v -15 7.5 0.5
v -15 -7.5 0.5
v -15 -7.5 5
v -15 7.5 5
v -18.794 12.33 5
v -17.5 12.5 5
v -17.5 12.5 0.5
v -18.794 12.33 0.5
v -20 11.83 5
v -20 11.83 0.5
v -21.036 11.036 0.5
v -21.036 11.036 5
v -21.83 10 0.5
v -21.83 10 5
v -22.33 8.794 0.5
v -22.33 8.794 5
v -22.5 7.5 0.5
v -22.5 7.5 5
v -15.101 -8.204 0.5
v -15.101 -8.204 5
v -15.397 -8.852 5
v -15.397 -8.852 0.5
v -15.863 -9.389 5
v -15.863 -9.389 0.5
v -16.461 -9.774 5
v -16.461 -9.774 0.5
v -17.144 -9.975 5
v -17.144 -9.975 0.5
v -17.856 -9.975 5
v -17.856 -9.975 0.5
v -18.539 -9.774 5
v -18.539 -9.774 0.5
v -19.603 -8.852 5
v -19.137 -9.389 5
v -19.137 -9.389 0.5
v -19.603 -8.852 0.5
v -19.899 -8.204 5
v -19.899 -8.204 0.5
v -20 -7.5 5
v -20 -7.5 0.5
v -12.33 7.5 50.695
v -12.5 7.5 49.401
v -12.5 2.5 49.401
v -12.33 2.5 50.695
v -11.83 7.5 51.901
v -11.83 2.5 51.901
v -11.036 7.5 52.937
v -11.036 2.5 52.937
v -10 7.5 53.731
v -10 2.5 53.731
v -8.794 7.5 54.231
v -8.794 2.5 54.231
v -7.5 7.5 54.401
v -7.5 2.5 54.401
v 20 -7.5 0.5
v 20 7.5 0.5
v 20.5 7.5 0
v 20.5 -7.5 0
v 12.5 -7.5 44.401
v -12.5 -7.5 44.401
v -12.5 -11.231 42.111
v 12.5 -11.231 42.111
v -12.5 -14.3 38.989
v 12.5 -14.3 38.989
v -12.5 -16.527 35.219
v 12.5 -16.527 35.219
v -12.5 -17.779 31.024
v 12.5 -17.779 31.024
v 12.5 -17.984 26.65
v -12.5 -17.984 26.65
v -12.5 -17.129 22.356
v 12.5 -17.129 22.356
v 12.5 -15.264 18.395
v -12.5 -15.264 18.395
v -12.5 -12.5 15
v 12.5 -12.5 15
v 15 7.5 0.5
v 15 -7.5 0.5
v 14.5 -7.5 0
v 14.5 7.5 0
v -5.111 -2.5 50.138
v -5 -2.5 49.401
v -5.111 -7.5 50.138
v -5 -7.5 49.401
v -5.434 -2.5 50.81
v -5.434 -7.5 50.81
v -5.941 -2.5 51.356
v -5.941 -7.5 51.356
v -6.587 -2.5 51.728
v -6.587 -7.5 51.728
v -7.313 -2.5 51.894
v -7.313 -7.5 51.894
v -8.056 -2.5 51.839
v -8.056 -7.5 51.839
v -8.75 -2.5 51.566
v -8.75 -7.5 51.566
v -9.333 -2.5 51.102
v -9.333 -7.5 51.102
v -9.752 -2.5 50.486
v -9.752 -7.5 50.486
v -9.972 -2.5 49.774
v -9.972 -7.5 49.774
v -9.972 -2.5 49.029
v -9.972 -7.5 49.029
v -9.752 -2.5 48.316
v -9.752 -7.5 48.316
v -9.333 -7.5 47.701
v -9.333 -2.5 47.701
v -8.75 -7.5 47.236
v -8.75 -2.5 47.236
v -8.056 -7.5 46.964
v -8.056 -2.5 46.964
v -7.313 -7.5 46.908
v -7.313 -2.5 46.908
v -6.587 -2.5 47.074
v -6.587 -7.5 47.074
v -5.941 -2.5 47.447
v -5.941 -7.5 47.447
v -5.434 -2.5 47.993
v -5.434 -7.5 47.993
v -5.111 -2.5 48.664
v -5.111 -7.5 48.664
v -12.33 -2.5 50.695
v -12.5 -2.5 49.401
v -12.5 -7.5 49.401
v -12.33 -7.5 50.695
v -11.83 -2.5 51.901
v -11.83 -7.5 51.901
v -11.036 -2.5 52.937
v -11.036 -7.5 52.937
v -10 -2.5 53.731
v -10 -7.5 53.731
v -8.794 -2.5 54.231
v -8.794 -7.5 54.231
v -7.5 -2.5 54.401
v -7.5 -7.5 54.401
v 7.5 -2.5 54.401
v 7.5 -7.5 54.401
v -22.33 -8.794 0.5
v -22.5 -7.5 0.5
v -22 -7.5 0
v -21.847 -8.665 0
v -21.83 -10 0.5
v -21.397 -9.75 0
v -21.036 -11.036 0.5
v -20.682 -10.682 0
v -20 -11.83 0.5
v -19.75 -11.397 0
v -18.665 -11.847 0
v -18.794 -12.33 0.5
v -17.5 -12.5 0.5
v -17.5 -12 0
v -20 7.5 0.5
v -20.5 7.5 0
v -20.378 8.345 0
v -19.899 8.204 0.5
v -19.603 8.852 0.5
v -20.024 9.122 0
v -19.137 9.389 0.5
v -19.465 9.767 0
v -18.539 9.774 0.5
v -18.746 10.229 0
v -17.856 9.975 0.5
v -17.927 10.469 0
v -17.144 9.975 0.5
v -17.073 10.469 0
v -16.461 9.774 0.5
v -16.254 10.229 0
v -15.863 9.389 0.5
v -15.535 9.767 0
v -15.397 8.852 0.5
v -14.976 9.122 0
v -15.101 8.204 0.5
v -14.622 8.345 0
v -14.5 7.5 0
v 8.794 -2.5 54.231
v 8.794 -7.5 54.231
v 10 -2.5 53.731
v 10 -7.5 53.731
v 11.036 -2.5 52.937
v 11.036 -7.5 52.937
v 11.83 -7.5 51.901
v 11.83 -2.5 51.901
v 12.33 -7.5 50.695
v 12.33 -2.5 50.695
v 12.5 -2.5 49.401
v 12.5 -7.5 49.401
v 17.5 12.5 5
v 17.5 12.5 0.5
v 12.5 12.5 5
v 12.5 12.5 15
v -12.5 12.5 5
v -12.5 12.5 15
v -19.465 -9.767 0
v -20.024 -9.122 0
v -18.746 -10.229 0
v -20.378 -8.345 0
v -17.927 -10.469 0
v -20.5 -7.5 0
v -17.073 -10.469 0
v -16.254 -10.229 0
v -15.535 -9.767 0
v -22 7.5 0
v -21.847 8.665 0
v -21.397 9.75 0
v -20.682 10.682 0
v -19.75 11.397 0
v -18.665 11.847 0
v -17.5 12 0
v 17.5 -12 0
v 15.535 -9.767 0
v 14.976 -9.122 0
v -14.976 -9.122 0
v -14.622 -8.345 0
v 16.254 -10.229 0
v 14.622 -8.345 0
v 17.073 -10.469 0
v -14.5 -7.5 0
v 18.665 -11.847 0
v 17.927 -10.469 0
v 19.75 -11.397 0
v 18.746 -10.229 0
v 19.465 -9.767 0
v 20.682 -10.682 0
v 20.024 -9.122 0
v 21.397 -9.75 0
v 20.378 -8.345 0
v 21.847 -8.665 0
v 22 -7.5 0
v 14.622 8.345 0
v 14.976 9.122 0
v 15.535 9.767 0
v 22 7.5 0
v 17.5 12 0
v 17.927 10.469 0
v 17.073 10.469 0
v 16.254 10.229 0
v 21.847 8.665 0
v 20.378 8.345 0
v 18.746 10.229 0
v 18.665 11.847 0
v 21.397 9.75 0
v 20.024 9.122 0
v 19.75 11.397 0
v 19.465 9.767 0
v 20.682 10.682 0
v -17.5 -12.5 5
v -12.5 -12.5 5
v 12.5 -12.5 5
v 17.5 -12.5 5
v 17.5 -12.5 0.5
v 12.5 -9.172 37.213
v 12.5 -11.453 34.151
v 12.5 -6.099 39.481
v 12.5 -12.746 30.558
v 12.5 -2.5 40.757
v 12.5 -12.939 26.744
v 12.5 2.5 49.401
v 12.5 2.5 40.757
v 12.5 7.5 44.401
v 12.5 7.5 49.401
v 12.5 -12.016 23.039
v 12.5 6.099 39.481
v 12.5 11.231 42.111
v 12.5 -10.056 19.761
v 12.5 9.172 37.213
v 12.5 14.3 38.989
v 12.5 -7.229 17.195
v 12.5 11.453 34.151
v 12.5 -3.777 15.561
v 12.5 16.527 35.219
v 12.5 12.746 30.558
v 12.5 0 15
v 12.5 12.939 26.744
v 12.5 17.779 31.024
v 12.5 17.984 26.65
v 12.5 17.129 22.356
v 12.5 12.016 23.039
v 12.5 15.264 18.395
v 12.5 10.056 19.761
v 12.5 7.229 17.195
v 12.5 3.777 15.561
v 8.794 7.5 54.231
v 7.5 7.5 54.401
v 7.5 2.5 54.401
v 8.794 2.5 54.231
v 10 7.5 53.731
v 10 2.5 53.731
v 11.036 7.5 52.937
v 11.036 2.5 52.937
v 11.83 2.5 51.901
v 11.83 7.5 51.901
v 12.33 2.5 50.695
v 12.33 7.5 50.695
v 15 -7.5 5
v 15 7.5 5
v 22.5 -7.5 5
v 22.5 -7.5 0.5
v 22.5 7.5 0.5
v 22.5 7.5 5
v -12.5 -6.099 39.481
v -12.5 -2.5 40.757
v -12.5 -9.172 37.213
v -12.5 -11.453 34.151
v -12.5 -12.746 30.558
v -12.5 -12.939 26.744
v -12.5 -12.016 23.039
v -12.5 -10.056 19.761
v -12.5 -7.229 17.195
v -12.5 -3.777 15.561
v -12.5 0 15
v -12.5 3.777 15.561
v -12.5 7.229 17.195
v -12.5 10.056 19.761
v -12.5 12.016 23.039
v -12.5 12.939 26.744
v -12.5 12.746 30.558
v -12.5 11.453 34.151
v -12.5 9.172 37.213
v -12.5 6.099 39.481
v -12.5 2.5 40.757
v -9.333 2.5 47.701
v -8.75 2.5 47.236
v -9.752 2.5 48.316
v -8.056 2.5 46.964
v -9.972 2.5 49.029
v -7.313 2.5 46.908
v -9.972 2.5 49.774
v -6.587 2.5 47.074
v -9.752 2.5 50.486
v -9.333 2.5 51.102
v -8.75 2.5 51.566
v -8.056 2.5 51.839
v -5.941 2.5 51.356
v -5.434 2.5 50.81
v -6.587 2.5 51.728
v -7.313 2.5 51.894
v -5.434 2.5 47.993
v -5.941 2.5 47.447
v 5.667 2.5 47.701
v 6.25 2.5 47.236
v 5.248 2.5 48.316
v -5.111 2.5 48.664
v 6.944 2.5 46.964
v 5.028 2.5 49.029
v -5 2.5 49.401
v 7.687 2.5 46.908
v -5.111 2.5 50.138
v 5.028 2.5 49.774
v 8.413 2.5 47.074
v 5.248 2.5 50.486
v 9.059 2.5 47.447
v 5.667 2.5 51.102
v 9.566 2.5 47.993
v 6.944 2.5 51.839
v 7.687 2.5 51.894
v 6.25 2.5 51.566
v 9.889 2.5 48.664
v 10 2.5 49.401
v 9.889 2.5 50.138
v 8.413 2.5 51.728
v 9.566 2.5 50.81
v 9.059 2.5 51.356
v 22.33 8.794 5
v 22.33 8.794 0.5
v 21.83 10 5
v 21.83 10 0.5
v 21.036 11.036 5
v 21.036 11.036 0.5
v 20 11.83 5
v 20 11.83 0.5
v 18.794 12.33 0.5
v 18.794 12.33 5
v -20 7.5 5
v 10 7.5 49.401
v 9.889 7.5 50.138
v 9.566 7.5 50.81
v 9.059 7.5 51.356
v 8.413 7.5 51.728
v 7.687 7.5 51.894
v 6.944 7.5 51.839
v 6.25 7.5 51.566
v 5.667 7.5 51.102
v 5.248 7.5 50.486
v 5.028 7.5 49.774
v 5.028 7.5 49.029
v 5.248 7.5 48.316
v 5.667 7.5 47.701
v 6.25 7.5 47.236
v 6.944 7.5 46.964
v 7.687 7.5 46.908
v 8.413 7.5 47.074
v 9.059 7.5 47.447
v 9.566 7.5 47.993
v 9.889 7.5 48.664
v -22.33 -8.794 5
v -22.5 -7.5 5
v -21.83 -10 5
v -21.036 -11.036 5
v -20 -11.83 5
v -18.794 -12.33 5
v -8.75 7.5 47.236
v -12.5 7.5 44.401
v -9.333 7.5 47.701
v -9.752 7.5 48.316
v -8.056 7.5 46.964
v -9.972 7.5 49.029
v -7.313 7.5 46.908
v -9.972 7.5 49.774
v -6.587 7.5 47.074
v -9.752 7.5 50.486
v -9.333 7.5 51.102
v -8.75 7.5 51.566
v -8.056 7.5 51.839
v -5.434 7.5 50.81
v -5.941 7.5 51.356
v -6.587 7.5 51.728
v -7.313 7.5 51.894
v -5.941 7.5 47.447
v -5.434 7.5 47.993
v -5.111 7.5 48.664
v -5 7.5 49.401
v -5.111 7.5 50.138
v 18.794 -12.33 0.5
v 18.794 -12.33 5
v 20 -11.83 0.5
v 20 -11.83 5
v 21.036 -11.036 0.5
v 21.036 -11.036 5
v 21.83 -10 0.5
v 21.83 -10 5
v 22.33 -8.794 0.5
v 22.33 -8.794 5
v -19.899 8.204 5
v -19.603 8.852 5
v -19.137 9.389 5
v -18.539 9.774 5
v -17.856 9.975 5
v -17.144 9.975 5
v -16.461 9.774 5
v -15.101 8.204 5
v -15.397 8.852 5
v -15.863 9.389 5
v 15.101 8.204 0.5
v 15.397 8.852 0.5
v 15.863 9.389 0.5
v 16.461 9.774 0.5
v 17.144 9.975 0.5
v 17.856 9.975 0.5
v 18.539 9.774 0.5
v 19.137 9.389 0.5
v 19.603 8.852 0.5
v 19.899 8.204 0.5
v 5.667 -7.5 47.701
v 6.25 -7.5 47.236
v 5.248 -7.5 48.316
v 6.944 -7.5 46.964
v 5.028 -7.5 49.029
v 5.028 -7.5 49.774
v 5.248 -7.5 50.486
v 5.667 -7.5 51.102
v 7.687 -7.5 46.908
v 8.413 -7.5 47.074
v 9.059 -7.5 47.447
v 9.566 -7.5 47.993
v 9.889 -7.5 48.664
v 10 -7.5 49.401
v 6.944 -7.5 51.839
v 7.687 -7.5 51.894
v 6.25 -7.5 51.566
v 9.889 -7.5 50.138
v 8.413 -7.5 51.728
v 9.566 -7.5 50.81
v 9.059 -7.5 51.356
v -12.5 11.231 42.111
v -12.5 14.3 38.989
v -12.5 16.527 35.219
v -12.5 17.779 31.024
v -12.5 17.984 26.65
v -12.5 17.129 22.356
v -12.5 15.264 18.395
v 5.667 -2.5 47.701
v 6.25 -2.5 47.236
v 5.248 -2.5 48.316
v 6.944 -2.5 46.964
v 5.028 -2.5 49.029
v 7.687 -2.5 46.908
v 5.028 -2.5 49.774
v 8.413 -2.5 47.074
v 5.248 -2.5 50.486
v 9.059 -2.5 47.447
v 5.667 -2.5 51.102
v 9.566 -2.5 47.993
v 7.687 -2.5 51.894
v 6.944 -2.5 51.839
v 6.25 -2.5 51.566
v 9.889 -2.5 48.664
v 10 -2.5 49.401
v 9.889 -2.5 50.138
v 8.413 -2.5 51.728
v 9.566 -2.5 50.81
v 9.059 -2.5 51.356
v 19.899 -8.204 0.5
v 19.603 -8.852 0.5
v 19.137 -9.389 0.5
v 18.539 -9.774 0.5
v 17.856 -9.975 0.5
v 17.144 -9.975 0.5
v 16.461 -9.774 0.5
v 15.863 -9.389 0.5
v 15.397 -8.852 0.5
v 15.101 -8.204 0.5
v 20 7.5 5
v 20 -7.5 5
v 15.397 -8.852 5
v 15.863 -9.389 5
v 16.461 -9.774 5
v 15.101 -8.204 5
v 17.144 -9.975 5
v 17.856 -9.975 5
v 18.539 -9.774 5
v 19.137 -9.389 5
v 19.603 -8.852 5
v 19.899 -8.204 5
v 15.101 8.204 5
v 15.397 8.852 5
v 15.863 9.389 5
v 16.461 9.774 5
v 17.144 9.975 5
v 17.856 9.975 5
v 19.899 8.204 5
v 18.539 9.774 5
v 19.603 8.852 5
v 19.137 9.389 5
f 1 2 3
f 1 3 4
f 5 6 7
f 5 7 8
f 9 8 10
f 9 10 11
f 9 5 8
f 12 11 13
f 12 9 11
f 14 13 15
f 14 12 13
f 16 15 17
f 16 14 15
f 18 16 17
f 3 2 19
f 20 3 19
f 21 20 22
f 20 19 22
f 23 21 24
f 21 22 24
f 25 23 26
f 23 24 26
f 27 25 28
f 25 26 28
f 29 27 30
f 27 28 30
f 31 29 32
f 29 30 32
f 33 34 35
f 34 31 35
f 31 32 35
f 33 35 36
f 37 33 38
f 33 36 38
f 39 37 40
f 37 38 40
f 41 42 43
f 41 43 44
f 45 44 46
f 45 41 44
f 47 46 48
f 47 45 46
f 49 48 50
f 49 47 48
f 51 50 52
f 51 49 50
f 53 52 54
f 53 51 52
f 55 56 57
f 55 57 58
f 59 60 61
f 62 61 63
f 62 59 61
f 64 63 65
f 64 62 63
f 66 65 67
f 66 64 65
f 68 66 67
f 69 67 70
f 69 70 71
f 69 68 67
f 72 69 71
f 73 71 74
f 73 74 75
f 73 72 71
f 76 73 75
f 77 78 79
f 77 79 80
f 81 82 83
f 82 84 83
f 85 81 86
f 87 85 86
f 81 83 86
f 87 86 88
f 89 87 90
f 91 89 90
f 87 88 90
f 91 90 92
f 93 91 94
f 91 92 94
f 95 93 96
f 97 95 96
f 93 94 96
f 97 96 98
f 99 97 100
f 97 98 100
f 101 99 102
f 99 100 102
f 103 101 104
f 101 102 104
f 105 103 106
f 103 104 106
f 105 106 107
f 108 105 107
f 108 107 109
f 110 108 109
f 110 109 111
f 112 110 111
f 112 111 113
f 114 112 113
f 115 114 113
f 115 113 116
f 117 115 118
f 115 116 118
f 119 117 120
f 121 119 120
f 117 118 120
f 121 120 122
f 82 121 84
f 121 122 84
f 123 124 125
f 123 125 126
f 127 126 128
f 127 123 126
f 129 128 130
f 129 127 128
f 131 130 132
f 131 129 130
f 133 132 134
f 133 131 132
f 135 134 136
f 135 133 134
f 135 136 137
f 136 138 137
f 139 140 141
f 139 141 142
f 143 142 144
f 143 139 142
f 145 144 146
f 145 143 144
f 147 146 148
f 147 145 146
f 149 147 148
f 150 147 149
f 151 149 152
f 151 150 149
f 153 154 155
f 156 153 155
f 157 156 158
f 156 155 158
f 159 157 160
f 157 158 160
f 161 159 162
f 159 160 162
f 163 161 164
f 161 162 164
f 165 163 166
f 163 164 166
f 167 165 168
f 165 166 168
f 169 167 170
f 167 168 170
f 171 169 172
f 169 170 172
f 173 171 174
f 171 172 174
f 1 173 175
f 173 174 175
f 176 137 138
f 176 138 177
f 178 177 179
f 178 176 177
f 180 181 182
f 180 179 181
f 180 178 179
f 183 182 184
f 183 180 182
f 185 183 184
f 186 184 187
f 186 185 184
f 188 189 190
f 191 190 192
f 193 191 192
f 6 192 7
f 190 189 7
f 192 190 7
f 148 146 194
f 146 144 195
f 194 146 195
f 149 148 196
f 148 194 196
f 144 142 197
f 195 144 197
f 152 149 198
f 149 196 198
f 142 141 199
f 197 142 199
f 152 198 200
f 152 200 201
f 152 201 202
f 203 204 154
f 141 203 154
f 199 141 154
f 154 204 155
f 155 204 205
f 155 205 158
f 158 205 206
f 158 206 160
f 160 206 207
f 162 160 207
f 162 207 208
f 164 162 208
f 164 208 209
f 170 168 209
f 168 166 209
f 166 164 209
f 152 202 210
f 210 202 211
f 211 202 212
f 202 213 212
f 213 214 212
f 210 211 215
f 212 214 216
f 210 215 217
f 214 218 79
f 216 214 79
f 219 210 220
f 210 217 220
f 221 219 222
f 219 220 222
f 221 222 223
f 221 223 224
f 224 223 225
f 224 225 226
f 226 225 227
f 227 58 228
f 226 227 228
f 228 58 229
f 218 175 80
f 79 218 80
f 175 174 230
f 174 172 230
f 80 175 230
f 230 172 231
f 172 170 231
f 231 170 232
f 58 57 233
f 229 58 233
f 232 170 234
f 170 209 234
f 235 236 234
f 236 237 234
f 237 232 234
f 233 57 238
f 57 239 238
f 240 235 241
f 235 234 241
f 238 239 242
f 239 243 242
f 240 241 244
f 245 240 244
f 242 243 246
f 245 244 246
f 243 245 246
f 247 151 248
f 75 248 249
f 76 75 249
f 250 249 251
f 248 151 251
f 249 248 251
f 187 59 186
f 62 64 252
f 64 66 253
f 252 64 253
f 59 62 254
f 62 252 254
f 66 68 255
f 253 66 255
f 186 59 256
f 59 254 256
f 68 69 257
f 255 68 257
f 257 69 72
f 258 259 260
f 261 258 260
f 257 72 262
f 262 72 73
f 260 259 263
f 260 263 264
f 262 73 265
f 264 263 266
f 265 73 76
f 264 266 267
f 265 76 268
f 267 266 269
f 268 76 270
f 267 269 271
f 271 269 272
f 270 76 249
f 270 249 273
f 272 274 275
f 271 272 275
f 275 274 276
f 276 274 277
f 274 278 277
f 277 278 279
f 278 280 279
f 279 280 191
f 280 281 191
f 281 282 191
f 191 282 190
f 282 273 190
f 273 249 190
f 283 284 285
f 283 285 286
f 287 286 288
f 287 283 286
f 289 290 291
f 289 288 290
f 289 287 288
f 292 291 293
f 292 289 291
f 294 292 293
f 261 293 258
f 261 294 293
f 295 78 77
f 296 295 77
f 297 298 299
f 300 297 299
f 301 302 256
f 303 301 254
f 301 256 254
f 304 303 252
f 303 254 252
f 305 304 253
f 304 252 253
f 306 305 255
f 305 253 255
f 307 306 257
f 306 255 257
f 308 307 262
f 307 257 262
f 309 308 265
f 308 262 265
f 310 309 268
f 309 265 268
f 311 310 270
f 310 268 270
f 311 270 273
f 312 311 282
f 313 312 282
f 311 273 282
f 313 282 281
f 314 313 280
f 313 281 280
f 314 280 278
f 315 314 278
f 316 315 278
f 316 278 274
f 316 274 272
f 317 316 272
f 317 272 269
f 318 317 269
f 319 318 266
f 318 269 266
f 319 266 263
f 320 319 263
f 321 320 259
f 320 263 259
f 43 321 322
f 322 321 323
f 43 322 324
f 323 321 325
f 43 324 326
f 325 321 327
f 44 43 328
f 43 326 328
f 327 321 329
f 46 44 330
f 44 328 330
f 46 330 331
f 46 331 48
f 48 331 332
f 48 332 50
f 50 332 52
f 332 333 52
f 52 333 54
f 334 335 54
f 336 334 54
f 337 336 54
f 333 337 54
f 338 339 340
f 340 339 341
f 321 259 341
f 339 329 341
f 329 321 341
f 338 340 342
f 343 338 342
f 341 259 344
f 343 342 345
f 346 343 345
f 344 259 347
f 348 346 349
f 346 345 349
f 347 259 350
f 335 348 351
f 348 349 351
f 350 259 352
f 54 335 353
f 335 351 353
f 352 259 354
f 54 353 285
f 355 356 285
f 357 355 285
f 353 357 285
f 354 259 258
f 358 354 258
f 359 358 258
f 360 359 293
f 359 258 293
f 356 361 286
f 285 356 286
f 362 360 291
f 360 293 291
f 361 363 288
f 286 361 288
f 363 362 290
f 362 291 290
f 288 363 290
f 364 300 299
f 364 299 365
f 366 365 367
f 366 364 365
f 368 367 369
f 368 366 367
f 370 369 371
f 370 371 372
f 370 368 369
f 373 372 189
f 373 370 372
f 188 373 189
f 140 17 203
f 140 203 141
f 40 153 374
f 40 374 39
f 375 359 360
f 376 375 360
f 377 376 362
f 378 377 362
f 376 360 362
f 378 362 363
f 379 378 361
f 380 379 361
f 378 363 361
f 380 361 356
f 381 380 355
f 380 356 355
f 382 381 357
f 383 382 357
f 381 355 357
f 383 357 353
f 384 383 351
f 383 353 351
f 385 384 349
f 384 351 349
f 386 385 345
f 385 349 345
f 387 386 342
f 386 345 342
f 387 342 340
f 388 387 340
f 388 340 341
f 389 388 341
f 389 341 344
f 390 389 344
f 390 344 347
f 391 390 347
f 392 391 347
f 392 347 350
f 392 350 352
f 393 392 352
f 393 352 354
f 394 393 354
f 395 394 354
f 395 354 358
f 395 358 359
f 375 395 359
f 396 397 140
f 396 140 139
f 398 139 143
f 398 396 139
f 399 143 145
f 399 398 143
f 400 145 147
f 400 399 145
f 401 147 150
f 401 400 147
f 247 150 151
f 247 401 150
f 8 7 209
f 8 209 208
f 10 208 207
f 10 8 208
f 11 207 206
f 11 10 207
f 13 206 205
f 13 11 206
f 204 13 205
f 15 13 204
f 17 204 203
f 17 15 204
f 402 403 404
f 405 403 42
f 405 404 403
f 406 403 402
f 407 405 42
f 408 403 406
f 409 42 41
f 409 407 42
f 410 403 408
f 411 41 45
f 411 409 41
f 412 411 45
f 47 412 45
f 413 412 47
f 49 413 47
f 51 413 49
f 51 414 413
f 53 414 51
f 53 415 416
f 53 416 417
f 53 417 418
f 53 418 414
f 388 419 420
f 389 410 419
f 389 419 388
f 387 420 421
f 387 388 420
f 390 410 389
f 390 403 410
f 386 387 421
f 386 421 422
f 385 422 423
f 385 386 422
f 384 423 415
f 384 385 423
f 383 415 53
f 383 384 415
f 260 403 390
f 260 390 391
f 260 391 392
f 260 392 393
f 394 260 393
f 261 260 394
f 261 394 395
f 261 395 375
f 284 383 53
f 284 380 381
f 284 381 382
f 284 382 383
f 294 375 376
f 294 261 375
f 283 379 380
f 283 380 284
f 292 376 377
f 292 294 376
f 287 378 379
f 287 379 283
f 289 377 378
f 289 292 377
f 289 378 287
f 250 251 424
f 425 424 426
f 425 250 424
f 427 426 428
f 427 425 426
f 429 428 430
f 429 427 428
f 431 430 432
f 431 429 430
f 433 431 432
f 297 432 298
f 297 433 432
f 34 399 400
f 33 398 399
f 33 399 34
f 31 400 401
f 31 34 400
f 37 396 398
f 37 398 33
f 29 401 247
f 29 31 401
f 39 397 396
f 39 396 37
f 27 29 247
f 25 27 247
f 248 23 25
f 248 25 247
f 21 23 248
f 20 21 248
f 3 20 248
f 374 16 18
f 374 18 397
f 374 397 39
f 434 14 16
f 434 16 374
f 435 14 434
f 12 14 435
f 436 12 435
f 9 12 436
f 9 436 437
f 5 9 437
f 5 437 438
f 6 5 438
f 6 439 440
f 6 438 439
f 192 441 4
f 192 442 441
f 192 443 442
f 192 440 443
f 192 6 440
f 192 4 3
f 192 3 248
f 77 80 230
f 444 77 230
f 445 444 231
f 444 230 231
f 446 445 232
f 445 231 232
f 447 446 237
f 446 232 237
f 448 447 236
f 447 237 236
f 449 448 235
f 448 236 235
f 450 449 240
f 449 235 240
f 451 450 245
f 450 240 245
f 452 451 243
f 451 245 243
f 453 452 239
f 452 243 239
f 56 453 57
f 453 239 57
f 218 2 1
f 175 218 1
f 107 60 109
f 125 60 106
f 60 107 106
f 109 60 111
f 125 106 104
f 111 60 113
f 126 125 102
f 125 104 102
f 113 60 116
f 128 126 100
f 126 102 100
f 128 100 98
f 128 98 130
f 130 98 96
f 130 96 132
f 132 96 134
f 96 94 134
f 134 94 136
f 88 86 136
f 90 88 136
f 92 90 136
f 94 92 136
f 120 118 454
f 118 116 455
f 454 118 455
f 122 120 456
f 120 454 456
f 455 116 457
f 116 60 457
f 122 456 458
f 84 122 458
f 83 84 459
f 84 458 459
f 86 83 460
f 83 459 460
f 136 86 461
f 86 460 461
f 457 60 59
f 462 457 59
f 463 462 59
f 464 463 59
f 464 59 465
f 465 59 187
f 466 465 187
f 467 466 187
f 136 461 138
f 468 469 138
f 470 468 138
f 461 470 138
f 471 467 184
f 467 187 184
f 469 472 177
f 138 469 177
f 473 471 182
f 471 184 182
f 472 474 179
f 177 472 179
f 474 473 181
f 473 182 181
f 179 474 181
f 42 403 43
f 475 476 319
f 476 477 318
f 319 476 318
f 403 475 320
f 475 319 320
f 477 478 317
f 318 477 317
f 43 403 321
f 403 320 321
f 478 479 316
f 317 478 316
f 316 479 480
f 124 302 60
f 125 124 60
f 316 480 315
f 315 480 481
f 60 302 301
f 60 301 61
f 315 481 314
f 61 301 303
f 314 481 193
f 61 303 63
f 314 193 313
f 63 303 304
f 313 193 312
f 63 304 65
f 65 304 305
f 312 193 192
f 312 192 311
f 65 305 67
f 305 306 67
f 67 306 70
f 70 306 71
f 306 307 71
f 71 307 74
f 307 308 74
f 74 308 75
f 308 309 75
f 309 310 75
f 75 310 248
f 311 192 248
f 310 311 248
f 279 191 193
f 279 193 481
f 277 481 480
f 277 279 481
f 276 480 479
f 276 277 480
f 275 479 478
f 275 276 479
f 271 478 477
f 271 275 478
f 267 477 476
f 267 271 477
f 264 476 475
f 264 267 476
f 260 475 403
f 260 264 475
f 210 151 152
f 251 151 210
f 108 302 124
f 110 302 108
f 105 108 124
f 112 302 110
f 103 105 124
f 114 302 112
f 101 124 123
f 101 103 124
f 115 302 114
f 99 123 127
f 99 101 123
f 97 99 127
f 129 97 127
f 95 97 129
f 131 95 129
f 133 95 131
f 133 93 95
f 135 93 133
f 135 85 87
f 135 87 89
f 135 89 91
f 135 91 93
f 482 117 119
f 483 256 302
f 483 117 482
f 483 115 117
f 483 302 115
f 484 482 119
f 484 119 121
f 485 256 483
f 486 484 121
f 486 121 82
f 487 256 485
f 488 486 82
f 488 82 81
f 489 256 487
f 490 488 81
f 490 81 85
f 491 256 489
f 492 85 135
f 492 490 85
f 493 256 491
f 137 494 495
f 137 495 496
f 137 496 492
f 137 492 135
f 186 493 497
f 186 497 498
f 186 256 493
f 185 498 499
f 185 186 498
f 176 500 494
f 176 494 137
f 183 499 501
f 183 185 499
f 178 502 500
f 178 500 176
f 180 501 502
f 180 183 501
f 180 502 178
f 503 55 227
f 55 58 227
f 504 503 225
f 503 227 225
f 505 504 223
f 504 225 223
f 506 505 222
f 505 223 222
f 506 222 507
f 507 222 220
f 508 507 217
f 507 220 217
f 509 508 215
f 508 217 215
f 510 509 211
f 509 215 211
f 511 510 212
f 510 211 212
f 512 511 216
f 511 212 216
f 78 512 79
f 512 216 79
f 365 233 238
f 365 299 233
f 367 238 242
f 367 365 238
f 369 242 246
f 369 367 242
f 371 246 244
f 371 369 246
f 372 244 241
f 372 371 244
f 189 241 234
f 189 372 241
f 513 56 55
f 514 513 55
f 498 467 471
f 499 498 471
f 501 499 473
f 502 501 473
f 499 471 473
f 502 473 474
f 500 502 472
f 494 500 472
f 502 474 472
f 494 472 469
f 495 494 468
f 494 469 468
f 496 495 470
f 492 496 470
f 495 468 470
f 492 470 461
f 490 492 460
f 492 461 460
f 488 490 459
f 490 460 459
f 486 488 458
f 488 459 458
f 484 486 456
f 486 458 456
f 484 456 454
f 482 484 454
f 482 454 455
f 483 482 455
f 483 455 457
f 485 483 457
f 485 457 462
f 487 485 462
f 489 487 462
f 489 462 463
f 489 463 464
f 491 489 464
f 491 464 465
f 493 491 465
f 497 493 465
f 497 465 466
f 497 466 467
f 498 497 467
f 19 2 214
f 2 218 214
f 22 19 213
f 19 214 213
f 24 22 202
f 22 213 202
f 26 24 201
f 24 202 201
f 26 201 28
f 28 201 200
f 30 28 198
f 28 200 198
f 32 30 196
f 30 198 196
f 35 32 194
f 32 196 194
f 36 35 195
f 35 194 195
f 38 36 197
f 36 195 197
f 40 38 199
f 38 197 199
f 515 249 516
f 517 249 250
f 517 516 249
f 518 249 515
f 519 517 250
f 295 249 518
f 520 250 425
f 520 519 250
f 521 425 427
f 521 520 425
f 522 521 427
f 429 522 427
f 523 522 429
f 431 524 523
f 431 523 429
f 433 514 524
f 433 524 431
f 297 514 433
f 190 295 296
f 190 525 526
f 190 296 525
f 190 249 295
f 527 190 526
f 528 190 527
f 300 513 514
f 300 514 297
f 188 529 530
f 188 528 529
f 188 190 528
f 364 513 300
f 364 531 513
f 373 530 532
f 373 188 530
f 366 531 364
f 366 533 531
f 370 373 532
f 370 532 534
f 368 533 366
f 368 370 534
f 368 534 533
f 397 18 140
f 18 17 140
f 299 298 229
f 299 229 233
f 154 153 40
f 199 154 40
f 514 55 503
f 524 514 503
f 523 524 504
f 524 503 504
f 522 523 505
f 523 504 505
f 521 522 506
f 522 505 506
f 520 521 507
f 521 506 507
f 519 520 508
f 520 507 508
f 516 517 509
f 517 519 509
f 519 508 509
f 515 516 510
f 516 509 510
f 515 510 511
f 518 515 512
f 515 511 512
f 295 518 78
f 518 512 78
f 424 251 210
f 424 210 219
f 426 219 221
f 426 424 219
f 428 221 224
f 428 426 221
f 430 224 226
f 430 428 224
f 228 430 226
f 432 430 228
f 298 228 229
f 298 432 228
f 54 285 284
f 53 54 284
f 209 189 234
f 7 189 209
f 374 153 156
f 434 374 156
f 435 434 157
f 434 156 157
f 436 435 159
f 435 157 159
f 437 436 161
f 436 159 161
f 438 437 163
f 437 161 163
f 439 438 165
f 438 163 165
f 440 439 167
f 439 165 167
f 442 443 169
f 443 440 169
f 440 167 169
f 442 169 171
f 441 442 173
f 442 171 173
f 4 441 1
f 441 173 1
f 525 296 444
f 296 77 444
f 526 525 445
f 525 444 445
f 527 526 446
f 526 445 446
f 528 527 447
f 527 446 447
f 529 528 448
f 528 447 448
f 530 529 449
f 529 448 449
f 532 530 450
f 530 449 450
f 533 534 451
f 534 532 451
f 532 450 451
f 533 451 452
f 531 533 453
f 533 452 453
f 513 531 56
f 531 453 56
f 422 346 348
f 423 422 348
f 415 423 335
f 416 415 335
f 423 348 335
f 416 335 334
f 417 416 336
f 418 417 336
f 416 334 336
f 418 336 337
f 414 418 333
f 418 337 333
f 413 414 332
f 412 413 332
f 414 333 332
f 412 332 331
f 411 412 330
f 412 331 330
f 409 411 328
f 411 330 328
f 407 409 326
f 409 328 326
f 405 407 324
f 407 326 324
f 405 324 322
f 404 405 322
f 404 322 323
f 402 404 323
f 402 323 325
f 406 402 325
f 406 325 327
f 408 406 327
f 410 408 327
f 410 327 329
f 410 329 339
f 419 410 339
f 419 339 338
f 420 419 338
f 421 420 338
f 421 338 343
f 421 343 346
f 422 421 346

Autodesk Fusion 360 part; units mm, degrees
sketch "Sketch1" plane through (0, 0, 0) normal (0, 0, 1) x (1, 0, 0)
  line L0 (22.5, 12.5) -> (-22.5, 12.5)
  line L1 (-22.5, 12.5) -> (-22.5, -12.5)
  line L2 (-22.5, -12.5) -> (22.5, -12.5)
  line L3 (22.5, -12.5) -> (22.5, 12.5)
  line L4 (22.5, 12.5) -> (-22.5, -12.5) construction
  line L5 (-22.5, 12.5) -> (22.5, -12.5) construction
  line L6 (-17.5, 12.5) -> (-17.5, -12.5) construction
  line L7 (0, -12.5) -> (0, 12.5) construction
  line L8 (-22.5, 0) -> (22.5, 0) construction
  line L9 (-20, 7.5) -> (-20, -7.5)
  line L10 (-15, -7.5) -> (-15, 7.5)
  arc A0 (-15, 7.5) -> (-20, 7.5) centre (-17.5, 7.5) ccw
  arc A1 (-20, -7.5) -> (-17.5, -5) centre (-17.5, -7.5) ccw
  line L11 (12.5, 12.5) -> (-12.5, 12.5)
  line L12 (-12.5, 12.5) -> (-12.5, -12.5)
  line L13 (-12.5, -12.5) -> (12.5, -12.5)
  line L14 (12.5, -12.5) -> (12.5, 12.5)
  line L15 (12.5, 12.5) -> (-12.5, -12.5) construction
  line L16 (-12.5, 12.5) -> (12.5, -12.5) construction
  arc A2 (20, 7.5) -> (15, 7.5) centre (17.5, 7.5) ccw
  line L17 (15, -7.5) -> (15, 7.5)
  line L18 (20, 7.5) -> (20, -7.5)
  arc A3 (17.5, -5) -> (20, -7.5) centre (17.5, -7.5) ccw
  dimension "d1" = 45
  dimension "d2" = 25
  dimension "d3" = 5
  dimension "d4" = 5
  dimension "d5" = 5
  dimension "d6" = 15
  dimension "d7" = 25
  dimension "d8" = 25
extrude "Extrude1" add sketch "Sketch1" along normal blind 5 contours L0 L2 L3 L14 | L0 L1 L2 L12 makes body 1 at (13.3333, -2.5, 0) makes body 2 at (-13.3333, -2.5, 0)
extrude "Extrude2" add sketch "Sketch1" along normal blind 15 contours L0 L2 L11 L12 L13 L14 bodies 1 2
sketch "Sketch2" plane through (12.5, 0, 0) normal (1, 0, 0) x (0, 1, 0)
  line L0 (-12.5, 5) -> (12.5, 5)
  line L1 (12.5, 5) -> (12.5, 15)
  line L2 (12.5, 15) -> (-12.5, 15)
  line L3 (-12.5, 15) -> (-12.5, 5)
  line L4 (-12.5, 15) -> (12.5, 15)
  circle A0 centre (0, 28) radius 13
  circle A1 centre (0, 28) radius 18.0347
  line L5 (0, 28) -> (0, 59) construction
  line L6 (-2.5, 40.7574) -> (-2.5, 54.4012)
  line L7 (2.5, 40.7574) -> (2.5, 54.4012)
  line L8 (-7.5, 38.6184) -> (-7.5, 54.4012)
  line L9 (7.5, 38.6184) -> (7.5, 54.4012)
  line L10 (-7.5, 54.4012) -> (-2.5, 54.4012)
  line L11 (2.5, 54.4012) -> (7.5, 54.4012)
  point P0 (0, 15)
  point P1 (7.5, 44.4012)
  dimension "d13" = 26
  dimension "d14" = 36.0694
  dimension "d15" = 5
  dimension "d17" = 5
  dimension "d18" = 5
  dimension "d20" = 10
extrude "Extrude3" add sketch "Sketch2" against normal blind 25 contours L2 L4 A0 A1 L8 | L2 L4 A0 A1 L9 | A1 L6 L8 L10 | A0 A1 L6 L8 | A0 A1 L7 L9 | A1 L7 L9 L11 bodies 1
sketch "Sketch3" plane through (0, -7.5, 0) normal (0, -1, 0) x (1, 0, 0)
  line L0 (12.5, 44.4012) -> (12.5, 54.4012)
  line L1 (12.5, 54.4012) -> (-12.5, 54.4012)
  line L2 (-12.5, 54.4012) -> (-12.5, 44.4012)
  line L3 (-12.5, 44.4012) -> (12.5, 44.4012)
  line L4 (0, 54.4012) -> (0, 44.4012) construction
  line L5 (-12.5, 49.4012) -> (12.5, 49.4012) construction
  circle A0 centre (-7.5, 49.4012) radius 2.5
  circle A1 centre (7.5, 49.4012) radius 2.5
  dimension "d23" = 5
  dimension "d24" = 5
  dimension "d25" = 15
extrude "Extrude4" cut sketch "Sketch3" against normal through all contours A0 | A1 bodies 1
fillet "Fillet1" radius 5 4 edges at (-22.5, 12.5, 2.5) (-22.5, -12.5, 2.5) (22.5, 12.5, 2.5) (22.5, -12.5, 2.5) on bodies 1
fillet "Fillet2" radius 5 4 edges at (12.5, -5, 54.4012) (12.5, 5, 54.4012) (-12.5, -5, 54.4012) (-12.5, 5, 54.4012) on bodies 1
chamfer "Chamfer1" distance 0.5 angle 45 1 faces at (-5, -2.5, 0) on bodies 1
